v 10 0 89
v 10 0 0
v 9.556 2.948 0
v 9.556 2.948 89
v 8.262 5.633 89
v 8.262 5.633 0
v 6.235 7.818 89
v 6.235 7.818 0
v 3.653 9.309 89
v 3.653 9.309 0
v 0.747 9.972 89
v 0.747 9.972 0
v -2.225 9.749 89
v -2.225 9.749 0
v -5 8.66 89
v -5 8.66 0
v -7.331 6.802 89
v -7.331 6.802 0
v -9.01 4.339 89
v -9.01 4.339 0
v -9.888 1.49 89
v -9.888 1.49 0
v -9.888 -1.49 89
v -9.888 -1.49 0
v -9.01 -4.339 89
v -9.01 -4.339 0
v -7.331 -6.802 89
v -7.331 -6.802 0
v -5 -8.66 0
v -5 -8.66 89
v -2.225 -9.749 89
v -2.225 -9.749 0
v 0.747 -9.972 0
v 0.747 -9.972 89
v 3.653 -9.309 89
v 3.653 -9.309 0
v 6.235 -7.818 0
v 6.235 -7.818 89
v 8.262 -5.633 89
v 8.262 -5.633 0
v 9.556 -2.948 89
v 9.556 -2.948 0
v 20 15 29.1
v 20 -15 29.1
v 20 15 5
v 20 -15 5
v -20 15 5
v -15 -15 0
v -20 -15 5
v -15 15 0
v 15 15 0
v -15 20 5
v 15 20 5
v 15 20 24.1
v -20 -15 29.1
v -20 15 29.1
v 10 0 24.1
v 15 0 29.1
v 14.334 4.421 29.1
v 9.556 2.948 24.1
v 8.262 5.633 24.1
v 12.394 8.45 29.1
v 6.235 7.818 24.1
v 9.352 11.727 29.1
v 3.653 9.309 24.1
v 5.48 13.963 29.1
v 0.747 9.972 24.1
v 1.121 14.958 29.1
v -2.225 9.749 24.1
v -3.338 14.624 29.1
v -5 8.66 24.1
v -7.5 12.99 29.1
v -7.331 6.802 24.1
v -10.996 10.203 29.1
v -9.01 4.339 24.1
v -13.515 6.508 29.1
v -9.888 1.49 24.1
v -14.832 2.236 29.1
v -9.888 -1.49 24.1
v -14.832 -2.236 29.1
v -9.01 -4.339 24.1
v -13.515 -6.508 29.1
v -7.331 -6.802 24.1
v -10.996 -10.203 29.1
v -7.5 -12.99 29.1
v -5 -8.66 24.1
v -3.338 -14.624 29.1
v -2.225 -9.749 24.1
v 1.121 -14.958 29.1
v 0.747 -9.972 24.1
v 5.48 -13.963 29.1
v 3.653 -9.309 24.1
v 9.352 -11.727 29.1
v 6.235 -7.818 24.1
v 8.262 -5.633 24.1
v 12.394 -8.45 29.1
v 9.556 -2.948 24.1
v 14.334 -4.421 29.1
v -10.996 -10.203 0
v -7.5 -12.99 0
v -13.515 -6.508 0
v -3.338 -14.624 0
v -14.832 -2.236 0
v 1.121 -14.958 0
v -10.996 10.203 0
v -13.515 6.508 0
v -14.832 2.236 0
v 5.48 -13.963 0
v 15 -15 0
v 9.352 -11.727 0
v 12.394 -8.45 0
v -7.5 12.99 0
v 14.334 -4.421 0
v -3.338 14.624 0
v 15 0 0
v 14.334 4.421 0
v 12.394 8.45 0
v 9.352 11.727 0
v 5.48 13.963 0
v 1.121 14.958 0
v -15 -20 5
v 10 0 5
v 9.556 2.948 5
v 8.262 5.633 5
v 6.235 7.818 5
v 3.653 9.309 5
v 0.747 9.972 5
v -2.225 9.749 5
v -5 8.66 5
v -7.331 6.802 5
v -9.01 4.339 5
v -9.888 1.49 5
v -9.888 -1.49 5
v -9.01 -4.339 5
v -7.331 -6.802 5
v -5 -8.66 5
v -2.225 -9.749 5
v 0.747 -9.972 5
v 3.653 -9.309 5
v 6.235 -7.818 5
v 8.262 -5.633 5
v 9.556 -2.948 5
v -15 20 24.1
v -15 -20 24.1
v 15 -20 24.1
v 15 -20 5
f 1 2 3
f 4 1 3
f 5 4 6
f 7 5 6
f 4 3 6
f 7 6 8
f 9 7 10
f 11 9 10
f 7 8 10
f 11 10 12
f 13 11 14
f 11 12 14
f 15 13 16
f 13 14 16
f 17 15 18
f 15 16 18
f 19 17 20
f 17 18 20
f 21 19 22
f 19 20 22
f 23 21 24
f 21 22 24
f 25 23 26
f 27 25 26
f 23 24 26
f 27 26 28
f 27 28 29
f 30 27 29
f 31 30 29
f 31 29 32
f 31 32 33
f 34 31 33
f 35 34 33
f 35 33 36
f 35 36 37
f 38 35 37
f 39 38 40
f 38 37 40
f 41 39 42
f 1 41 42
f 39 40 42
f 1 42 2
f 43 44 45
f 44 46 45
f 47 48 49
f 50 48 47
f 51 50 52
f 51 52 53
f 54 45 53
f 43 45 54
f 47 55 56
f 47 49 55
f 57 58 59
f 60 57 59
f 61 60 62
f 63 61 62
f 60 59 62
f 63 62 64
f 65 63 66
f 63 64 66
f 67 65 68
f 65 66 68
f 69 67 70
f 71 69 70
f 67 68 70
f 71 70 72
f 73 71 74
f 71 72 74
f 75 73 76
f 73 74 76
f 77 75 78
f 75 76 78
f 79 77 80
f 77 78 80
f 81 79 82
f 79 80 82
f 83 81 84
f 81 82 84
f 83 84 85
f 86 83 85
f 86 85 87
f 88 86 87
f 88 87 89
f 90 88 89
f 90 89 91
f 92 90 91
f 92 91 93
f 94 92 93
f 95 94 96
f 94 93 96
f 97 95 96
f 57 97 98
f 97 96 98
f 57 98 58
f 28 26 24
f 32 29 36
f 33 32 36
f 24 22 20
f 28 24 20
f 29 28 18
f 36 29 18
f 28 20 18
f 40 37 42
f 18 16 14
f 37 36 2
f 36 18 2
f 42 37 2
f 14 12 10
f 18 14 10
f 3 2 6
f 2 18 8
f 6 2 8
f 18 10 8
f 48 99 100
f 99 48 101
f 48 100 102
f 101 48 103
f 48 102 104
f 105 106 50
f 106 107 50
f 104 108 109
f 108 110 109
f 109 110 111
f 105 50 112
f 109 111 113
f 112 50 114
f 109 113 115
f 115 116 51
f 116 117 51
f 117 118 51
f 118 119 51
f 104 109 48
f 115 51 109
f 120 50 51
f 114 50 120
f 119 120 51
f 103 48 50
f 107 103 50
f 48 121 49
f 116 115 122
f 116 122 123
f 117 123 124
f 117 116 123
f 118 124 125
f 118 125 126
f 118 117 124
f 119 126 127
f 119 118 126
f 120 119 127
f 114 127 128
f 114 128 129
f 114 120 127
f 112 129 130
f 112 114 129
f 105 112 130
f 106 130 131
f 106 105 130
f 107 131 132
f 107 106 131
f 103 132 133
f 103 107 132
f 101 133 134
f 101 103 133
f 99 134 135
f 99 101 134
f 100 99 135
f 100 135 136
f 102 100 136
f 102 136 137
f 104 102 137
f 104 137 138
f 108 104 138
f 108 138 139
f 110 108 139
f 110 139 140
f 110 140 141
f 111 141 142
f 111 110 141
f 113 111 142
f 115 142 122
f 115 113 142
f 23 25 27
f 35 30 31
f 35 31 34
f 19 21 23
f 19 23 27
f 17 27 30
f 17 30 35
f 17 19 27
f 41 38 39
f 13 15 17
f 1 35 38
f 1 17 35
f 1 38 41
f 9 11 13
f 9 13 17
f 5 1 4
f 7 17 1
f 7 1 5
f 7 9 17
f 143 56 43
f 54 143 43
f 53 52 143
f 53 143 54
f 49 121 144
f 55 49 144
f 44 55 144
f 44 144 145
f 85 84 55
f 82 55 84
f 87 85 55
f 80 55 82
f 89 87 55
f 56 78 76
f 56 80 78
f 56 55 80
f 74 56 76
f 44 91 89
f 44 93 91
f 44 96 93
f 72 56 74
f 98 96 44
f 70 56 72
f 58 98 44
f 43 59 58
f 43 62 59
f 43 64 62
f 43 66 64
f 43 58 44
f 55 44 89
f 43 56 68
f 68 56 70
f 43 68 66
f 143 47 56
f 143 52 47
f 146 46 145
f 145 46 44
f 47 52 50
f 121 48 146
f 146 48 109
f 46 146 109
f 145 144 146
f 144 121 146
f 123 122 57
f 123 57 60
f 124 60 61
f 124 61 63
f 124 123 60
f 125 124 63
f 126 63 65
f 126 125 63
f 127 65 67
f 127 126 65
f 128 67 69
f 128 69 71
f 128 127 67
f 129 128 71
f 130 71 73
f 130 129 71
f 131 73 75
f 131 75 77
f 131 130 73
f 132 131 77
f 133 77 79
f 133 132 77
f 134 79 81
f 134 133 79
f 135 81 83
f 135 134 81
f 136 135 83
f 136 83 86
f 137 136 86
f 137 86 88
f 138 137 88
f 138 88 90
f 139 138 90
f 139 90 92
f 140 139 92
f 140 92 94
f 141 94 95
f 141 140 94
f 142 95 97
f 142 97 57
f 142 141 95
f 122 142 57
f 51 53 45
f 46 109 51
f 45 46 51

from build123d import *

# Parameters (mm, degrees)
F0_W     = 40
F0_H     = 40
F0_R     = 10
F1_DEPTH = 29.1
F2_DEPTH = 89
F3_SIZE  = 4.99999


# Not quite as in the source:
# - a fillet or chamfer is up to 0.001 mm smaller than in the source, because OpenCascade refuses the exact size


with BuildPart() as f1:
    # F0 (on Top) → F1 (new body)
    with BuildSketch(Plane.XY):
        Rectangle(F0_W, F0_H)
        Circle(F0_R, mode=Mode.SUBTRACT)
    extrude(amount=F1_DEPTH)

    # F3 (size 5 in the source; OpenCascade refuses exactly that, so slightly less here)
    f3_edges = [f1.edges().sort_by_distance(p)[0] for p in [
        (0, -20, 29.1),
        (0, -20, 0),
        (-20, -20, 14.55),
        (20, -20, 14.55),
        (20, 20, 14.55),
        (-20, 20, 14.55),
        (0, 20, 0),
        (0, 20, 29.1),
        (-10, 0, 29.1),
        (20, 0, 0),
        (-20, 0, 0),
        (-10, 0, 0),
    ]]
    chamfer(f3_edges, length=F3_SIZE)


with BuildPart() as f2:
    # F0 (on Top) → F2 (new body)
    with BuildSketch(Plane.XY):
        Circle(F0_R)
    extrude(amount=F2_DEPTH)


solid = Compound([f1.part, f2.part])
